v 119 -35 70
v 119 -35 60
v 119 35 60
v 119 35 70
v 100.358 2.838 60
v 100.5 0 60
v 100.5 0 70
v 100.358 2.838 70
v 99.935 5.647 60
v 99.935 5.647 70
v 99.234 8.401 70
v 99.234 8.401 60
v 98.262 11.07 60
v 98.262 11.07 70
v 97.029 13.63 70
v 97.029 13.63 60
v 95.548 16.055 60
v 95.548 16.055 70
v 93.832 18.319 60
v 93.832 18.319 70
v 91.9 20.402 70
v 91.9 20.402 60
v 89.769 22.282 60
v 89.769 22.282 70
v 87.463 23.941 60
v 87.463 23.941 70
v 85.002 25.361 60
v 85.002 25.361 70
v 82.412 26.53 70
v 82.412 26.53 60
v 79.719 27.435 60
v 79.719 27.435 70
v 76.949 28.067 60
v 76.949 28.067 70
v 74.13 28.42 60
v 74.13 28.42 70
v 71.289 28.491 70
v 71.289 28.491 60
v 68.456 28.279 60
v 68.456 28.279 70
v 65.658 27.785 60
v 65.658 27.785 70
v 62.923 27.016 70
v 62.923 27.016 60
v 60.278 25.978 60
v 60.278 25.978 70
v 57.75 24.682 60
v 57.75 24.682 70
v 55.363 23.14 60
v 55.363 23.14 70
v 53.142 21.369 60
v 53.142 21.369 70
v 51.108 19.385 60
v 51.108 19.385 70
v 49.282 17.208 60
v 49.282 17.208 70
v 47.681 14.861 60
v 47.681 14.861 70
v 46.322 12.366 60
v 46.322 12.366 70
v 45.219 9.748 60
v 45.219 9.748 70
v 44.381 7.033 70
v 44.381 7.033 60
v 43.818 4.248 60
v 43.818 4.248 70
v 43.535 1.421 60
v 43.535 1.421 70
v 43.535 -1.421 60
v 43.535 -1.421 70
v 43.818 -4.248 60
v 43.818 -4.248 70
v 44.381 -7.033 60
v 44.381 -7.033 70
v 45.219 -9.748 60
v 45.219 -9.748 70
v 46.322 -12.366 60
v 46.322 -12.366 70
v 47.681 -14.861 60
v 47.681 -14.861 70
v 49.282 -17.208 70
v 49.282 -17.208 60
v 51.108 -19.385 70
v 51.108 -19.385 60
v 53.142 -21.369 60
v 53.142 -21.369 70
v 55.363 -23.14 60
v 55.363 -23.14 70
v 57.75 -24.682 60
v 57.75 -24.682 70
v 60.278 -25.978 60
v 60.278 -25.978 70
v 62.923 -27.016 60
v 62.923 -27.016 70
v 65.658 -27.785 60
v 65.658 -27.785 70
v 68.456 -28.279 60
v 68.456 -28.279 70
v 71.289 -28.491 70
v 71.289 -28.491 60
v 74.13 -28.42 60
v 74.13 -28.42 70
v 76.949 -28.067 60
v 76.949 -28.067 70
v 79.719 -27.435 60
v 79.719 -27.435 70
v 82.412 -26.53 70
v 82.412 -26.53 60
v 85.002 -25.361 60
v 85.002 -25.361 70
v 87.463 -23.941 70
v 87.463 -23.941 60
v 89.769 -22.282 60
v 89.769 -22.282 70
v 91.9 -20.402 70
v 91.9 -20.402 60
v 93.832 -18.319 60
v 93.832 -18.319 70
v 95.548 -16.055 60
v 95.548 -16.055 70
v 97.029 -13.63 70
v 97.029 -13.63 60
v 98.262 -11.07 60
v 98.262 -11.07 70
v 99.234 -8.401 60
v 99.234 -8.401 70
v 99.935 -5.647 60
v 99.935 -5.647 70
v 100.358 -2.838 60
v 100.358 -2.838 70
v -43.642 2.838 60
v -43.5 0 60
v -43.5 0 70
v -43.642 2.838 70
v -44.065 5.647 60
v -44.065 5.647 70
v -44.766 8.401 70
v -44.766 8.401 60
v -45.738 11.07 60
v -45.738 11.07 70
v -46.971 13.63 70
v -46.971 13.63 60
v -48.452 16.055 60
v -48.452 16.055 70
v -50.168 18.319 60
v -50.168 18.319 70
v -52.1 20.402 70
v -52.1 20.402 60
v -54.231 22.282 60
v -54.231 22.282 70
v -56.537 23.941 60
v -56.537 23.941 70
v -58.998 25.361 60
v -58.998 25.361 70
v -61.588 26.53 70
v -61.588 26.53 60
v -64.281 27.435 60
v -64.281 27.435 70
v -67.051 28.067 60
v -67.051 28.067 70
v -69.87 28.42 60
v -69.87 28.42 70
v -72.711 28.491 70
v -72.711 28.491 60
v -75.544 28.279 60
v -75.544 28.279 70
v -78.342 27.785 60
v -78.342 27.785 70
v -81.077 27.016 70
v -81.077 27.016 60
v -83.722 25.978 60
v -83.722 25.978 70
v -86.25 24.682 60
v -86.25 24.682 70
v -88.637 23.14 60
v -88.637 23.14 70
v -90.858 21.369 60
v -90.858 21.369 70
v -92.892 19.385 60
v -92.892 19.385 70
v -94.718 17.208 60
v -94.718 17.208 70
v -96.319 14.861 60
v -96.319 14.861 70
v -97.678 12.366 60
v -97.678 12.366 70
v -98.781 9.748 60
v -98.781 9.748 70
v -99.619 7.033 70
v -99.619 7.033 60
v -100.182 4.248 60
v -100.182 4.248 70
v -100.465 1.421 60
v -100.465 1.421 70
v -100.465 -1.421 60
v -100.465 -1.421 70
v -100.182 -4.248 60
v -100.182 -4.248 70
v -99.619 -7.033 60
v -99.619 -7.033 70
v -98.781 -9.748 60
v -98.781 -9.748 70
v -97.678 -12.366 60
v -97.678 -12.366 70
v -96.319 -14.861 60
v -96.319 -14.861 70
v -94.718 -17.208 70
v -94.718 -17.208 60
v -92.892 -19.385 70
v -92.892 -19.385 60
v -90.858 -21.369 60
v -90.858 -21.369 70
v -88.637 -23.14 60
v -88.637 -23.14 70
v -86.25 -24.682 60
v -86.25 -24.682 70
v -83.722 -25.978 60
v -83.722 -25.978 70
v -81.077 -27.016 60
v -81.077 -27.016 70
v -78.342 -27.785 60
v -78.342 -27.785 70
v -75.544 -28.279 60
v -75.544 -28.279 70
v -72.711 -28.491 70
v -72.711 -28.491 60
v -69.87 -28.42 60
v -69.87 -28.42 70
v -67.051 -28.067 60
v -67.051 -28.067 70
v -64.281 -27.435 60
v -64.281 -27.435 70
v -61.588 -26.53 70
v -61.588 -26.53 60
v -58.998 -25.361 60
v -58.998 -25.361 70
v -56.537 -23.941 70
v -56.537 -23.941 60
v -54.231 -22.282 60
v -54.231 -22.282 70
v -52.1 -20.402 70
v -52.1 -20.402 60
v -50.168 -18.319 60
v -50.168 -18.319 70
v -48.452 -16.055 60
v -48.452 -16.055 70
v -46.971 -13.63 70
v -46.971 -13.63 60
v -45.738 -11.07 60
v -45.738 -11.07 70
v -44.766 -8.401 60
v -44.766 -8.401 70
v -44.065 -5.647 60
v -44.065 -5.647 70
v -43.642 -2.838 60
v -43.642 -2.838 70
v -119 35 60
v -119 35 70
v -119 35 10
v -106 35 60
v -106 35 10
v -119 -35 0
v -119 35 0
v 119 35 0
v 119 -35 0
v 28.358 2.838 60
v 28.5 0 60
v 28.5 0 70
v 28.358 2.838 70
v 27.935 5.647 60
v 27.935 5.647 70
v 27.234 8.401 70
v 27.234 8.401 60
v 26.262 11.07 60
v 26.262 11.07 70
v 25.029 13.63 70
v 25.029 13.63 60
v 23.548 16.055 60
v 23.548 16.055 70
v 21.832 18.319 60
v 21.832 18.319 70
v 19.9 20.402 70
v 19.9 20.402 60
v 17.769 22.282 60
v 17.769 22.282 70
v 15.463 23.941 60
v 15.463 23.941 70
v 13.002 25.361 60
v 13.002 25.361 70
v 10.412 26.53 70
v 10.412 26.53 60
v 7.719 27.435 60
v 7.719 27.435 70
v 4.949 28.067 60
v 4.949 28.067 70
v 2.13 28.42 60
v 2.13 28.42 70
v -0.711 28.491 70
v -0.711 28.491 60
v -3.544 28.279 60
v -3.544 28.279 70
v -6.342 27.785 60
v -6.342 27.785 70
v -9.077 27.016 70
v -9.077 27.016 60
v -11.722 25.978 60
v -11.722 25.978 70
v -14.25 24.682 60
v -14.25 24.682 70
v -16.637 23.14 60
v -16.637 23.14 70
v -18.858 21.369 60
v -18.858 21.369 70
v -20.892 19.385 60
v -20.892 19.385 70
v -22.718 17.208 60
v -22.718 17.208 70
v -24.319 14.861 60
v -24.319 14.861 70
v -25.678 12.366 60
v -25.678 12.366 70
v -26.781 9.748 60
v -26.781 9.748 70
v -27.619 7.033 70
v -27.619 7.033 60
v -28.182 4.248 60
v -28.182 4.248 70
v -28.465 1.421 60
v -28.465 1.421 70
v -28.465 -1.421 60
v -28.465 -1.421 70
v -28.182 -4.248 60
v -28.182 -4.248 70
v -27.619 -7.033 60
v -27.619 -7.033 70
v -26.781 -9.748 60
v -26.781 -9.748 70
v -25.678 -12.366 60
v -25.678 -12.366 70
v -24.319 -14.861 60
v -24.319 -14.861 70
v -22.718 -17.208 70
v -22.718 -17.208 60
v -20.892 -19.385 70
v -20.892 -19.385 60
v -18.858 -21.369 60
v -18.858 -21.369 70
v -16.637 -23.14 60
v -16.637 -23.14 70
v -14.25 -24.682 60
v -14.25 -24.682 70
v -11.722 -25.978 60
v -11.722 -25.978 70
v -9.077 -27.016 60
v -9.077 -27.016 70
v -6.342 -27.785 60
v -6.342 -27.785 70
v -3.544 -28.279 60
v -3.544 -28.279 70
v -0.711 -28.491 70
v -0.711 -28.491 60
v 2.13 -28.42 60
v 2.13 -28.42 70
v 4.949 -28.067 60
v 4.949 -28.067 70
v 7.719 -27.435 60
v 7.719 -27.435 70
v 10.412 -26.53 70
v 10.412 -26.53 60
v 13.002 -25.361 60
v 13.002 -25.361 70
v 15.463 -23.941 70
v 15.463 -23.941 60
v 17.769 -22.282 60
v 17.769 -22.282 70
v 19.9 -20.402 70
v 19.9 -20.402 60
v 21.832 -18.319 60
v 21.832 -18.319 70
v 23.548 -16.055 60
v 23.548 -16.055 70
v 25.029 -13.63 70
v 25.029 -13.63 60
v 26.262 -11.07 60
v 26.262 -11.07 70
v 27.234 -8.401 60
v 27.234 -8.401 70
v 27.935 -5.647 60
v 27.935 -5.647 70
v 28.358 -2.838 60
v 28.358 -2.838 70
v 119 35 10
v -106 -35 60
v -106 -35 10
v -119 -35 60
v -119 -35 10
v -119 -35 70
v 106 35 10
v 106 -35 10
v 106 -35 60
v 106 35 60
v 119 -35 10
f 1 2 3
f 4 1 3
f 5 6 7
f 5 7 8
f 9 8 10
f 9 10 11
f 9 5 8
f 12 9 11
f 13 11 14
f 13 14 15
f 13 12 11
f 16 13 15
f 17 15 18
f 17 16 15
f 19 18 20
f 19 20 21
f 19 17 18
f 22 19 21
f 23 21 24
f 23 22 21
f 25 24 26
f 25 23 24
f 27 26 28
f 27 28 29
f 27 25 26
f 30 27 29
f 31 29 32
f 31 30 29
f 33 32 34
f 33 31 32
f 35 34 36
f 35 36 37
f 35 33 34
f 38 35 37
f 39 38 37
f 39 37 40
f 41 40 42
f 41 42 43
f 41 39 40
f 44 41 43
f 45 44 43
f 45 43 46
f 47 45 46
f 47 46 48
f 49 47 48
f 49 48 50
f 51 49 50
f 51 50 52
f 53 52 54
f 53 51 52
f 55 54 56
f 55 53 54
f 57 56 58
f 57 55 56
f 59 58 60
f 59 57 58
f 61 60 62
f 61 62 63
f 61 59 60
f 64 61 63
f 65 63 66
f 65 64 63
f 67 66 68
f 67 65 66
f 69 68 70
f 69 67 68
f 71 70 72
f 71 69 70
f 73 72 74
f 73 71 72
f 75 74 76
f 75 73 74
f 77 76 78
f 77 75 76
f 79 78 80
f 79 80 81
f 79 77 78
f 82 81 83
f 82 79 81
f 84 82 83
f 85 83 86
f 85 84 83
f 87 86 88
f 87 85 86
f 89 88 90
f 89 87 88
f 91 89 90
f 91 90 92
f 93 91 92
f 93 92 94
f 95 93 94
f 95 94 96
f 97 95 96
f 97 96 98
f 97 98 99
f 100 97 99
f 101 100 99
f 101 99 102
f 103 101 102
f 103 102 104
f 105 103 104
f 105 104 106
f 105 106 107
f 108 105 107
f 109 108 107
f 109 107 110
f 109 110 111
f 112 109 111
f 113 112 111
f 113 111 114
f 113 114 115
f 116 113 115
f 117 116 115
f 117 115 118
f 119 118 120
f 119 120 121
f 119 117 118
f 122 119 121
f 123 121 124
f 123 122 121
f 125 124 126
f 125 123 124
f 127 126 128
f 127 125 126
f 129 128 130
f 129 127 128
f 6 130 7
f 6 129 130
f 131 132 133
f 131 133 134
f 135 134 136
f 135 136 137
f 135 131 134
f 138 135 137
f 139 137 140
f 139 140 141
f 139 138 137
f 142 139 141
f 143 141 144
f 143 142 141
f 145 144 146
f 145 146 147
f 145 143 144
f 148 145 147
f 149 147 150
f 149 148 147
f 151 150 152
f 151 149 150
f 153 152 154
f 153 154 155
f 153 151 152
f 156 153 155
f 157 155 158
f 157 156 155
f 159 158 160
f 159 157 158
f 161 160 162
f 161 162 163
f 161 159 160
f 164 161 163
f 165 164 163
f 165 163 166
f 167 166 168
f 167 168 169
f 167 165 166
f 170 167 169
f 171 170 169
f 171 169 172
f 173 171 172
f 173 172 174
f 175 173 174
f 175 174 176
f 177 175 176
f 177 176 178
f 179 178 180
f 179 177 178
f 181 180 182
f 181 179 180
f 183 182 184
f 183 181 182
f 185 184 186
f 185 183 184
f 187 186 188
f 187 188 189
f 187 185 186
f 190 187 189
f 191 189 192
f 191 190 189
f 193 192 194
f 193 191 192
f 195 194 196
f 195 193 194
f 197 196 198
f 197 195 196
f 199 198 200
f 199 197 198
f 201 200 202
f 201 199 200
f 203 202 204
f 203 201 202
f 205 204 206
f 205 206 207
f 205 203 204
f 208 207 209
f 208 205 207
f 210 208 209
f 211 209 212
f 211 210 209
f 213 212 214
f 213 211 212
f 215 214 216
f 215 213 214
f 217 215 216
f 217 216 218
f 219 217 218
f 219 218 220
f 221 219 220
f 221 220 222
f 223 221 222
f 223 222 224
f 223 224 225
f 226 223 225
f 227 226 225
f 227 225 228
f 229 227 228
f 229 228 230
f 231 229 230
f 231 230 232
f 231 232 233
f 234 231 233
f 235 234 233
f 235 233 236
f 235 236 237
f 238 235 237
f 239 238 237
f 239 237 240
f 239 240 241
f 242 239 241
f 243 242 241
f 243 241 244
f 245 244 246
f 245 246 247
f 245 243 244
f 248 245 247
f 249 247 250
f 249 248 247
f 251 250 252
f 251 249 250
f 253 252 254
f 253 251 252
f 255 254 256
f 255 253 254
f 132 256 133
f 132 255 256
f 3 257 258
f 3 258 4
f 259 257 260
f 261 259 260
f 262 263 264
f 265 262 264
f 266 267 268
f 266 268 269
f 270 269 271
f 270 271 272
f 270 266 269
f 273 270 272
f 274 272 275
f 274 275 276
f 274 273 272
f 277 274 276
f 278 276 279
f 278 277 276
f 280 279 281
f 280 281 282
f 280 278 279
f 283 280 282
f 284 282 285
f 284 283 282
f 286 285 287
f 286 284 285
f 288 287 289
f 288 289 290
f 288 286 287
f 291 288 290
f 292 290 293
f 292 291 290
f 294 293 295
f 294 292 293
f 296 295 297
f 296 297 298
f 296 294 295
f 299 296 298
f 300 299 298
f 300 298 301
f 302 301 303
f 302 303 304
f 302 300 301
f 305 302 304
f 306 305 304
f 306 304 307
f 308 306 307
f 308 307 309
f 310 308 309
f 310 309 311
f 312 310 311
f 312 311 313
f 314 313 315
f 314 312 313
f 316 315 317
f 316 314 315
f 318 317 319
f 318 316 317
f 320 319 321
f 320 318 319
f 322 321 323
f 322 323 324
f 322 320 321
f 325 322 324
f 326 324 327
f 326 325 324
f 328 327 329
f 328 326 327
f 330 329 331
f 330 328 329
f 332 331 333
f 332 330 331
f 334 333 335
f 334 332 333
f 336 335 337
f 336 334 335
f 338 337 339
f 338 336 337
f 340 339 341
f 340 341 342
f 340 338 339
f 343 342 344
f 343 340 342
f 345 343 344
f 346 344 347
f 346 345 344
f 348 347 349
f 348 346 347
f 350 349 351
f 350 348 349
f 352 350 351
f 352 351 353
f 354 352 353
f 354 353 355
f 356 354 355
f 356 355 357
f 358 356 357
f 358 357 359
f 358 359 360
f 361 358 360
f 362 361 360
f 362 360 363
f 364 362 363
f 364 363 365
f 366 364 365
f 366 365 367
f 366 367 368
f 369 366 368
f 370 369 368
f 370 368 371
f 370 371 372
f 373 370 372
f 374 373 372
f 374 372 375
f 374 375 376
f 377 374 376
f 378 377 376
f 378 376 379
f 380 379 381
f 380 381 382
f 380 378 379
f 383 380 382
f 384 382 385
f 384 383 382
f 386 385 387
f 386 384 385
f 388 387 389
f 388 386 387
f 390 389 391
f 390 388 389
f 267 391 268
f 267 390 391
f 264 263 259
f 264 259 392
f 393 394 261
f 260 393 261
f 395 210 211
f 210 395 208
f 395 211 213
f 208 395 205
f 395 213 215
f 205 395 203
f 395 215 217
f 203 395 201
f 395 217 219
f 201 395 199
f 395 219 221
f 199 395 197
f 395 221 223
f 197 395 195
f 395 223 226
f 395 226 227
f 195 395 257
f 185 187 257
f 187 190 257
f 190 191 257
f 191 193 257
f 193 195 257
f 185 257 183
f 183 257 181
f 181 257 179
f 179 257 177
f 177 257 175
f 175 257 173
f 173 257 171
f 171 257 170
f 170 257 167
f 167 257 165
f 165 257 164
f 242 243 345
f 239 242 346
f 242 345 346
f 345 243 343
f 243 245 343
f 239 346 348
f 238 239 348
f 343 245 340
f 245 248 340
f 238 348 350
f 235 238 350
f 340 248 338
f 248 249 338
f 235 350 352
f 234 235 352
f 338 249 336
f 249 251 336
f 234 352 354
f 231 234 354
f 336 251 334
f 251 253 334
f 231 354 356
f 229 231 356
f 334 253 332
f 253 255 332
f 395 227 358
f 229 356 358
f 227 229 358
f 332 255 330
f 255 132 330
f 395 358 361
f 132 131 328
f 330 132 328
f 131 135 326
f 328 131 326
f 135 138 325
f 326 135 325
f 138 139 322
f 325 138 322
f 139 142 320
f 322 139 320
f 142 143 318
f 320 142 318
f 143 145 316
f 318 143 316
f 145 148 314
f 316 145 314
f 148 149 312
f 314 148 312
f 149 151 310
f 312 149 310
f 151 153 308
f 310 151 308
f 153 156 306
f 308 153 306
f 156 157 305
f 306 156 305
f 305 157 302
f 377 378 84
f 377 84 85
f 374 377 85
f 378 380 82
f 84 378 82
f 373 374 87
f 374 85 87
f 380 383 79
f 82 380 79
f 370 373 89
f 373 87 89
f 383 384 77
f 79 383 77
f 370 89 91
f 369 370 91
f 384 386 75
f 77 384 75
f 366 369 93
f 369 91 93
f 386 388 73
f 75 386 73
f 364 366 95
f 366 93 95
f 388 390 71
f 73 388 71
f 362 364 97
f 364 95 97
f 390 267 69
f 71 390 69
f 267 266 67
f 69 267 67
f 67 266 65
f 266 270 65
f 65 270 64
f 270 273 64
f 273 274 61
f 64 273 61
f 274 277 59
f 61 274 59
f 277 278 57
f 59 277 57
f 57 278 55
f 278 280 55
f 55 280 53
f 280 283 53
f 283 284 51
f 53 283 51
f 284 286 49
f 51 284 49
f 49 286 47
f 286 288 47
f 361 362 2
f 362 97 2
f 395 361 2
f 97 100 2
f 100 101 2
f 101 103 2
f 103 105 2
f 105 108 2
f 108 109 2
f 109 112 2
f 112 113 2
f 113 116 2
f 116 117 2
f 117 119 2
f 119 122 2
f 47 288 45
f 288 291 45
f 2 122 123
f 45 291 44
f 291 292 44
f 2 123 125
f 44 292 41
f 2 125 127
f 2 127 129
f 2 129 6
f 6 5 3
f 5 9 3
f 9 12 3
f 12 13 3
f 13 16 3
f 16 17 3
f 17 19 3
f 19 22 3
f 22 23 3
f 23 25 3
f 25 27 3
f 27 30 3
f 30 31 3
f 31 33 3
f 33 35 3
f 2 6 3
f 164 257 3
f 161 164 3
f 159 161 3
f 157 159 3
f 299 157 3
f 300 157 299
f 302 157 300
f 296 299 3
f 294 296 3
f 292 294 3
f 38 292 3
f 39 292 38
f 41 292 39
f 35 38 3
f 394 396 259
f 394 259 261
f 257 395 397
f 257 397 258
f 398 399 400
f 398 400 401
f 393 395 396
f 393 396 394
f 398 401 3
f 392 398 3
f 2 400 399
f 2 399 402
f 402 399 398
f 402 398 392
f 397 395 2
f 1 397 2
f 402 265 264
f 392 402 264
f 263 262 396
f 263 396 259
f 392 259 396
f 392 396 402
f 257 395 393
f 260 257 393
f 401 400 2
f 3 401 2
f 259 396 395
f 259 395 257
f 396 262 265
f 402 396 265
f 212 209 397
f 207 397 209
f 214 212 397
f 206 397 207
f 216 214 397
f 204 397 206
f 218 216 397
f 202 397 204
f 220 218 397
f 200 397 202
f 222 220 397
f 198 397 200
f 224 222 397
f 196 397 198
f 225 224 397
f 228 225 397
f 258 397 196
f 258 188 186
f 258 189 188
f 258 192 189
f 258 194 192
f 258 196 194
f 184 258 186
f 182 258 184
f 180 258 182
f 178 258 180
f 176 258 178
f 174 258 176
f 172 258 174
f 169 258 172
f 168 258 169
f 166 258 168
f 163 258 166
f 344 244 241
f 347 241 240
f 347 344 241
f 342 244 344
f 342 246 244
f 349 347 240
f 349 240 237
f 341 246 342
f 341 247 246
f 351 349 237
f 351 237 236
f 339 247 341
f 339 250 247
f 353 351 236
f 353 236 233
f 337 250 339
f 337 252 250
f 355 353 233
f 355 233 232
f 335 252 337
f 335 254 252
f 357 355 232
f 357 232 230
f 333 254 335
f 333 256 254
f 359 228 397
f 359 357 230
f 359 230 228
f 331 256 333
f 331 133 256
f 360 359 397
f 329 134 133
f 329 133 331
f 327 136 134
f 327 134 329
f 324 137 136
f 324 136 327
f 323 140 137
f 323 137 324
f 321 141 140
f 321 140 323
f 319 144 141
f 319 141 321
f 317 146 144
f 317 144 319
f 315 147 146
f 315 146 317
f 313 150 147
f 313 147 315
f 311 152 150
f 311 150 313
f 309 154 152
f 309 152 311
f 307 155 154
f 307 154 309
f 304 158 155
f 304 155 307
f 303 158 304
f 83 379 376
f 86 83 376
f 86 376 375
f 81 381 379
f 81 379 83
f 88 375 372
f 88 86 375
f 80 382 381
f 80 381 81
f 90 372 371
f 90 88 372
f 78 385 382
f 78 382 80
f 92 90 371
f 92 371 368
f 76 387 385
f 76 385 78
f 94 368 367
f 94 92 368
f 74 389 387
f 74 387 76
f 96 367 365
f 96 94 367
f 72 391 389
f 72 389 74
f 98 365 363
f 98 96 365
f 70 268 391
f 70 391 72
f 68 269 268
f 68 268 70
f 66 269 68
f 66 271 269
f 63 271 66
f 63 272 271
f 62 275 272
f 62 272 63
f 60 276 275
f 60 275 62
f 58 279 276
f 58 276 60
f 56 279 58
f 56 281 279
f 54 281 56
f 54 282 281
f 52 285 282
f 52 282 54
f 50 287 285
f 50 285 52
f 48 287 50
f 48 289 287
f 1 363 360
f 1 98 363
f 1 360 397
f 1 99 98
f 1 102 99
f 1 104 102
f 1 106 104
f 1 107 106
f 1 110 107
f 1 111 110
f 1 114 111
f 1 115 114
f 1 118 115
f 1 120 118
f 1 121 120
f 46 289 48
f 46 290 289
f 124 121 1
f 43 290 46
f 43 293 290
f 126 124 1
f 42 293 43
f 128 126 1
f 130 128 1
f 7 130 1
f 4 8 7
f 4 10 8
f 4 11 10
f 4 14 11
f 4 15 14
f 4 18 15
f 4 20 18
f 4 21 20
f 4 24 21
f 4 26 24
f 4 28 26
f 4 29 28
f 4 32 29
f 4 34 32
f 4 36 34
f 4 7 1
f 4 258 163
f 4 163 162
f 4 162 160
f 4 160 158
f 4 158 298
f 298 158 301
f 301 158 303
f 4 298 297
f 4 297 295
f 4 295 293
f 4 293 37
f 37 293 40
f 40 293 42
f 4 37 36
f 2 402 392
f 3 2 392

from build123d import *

# Parameters (mm, degrees)
F0_W     = 238
F0_H     = 70
F1_DEPTH = 10
F3_W     = 238
F3_H     = 70
F3_R     = 28.5
F4_DEPTH = 10
F5_W     = 13
F5_H     = 70
F6_DEPTH = 50


with BuildPart() as f1:
    # F0 (on Top) → F1 (new body)
    with BuildSketch(Plane.XY):
        Rectangle(F0_W, F0_H)
    extrude(amount=F1_DEPTH)


with BuildPart() as f4:
    # F3 (on offset) → F4 (new body)
    with BuildSketch(Plane.XY.offset(60)):
        Rectangle(F3_W, F3_H)
        with Locations((-72, 0)):
            Circle(F3_R, mode=Mode.SUBTRACT)
        Circle(F3_R, mode=Mode.SUBTRACT)
        with Locations((72, 0)):
            Circle(F3_R, mode=Mode.SUBTRACT)
    extrude(amount=F4_DEPTH)


with BuildPart() as f6:
    # F5 (on face) → F6 (new body, through all)
    with BuildSketch(Plane.XY.offset(10)):
        with Locations((-112.5, 0)):
            Rectangle(F5_W, F5_H)
        with Locations((112.5, 0)):
            Rectangle(F5_W, F5_H)
    extrude(amount=F6_DEPTH)


solid = Compound([f1.part, f4.part, f6.part])
